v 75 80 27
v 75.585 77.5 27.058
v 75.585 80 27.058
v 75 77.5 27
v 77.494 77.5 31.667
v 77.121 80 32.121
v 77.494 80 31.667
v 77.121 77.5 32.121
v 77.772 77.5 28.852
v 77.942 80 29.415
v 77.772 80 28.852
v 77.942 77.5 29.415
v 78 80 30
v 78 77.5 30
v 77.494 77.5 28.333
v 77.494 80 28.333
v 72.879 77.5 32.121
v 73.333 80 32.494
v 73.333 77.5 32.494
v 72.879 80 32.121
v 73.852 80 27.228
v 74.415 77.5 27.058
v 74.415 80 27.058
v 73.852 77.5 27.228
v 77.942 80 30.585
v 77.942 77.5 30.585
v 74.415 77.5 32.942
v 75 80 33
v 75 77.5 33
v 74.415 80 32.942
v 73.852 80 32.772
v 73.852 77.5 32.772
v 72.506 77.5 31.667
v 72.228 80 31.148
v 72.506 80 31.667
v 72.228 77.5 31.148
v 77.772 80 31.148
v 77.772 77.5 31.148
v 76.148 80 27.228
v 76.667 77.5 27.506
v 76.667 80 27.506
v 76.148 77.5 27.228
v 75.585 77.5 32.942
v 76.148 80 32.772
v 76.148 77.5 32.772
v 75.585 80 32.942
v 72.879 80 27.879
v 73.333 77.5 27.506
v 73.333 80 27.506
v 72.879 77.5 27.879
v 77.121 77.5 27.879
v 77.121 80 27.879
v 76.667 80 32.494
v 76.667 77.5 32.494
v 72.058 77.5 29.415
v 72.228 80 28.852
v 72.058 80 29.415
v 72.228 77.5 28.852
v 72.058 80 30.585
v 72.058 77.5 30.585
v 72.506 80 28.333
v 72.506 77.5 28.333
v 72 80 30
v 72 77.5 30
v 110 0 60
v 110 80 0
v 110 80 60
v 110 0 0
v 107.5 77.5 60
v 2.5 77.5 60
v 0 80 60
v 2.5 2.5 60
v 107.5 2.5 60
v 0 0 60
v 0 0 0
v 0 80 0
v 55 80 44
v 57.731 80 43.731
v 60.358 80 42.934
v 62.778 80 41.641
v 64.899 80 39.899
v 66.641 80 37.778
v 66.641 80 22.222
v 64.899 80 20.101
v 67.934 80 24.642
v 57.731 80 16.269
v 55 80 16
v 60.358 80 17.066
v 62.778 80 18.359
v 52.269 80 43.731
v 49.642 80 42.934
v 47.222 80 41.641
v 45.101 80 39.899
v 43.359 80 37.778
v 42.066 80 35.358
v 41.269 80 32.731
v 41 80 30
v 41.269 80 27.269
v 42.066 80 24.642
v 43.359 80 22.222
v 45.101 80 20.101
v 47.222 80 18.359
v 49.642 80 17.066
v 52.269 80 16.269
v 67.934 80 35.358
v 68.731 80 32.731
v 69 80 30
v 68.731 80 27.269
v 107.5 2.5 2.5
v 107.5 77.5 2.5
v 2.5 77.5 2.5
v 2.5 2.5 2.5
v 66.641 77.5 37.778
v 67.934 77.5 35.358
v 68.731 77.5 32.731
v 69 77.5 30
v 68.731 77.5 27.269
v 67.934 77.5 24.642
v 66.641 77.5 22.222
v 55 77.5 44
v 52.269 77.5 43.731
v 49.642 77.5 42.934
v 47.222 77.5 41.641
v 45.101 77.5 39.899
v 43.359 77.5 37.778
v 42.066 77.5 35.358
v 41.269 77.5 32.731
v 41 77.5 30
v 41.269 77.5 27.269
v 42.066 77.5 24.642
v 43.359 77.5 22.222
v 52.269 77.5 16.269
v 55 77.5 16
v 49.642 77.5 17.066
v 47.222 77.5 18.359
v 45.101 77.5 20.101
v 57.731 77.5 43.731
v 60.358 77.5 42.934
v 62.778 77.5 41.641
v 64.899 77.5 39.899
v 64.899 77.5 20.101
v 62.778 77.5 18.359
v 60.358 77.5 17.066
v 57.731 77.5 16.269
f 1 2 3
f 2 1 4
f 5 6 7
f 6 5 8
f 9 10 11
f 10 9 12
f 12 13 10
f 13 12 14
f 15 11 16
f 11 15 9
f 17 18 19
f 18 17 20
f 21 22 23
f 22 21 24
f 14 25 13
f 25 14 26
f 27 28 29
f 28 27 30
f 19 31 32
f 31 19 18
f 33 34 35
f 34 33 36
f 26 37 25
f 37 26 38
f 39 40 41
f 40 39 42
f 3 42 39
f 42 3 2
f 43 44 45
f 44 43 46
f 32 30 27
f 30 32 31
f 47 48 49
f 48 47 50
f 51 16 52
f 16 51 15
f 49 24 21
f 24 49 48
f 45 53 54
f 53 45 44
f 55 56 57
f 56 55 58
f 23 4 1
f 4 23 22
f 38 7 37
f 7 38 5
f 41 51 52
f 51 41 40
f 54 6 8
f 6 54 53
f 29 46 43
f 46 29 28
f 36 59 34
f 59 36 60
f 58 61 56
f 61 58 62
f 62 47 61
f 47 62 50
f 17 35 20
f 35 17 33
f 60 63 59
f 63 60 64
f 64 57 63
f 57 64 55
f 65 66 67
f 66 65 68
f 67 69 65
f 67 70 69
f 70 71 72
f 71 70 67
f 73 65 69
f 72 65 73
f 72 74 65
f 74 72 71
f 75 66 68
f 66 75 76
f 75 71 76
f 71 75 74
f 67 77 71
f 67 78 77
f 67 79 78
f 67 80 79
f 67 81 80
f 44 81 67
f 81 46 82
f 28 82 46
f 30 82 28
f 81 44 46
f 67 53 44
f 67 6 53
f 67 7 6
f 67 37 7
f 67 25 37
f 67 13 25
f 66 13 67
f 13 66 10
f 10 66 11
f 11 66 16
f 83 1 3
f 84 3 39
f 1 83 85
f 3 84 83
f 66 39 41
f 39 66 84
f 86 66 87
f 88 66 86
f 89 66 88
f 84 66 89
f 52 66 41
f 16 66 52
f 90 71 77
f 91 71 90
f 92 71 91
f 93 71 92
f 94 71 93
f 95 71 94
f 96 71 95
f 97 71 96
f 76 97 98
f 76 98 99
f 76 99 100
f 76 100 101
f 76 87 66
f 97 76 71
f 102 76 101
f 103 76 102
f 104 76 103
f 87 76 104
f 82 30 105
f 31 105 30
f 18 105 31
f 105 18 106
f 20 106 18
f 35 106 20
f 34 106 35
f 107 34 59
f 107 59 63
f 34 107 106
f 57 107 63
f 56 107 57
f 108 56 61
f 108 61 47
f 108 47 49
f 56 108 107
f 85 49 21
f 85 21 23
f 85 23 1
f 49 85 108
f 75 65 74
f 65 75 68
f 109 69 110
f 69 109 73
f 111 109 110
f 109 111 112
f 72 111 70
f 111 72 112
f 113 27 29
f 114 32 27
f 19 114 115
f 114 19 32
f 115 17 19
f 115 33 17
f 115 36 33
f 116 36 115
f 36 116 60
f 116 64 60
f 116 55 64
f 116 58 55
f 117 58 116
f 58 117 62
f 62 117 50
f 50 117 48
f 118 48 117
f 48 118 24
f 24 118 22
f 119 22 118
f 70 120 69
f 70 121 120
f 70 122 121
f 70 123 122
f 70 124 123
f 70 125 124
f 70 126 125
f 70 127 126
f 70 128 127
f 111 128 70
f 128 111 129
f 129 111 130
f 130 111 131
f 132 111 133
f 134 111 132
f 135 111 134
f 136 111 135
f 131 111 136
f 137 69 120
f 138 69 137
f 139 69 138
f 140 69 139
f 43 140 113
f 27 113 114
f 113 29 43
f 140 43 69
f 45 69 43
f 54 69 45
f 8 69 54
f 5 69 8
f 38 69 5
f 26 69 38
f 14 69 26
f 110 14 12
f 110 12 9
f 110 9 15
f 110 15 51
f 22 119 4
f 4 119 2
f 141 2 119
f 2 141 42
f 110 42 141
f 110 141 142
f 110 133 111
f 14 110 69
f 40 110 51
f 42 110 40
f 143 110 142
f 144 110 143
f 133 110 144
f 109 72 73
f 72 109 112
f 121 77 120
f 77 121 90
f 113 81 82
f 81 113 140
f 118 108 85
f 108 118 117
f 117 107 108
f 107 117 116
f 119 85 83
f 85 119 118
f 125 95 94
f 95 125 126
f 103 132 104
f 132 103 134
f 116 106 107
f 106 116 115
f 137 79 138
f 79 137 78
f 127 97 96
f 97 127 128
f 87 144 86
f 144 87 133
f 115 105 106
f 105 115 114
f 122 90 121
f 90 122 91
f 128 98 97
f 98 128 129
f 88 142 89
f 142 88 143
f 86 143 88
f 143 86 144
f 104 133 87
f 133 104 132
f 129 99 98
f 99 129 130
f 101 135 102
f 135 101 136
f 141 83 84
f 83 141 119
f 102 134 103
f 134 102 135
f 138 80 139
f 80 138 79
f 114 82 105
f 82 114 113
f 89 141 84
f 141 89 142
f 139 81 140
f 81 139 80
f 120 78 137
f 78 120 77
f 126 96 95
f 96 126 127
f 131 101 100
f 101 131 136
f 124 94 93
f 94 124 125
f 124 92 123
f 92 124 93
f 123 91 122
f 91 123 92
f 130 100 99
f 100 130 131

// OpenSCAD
$fn = 32;

// ----------------------------------------------------------------------
// Vent box: roundvent enclosure
// ----------------------------------------------------------------------

// --- parameters (mm) ---
box_l = 110;              // box length, X
box_w = 80;               // box width, Y
box_h = 60;               // box height, Z
wall_t = 2.5;             // shell wall thickness
vent_d = 28;              // central vent diameter
ring_d = 6;               // ring hole diameter
n_ring = 8;               // holes in the ring
ring_r = 20;              // ring radius

ring_step = 360 / n_ring;  // ring hole angular step

difference() {
  cube([box_l, box_w, box_h]);
  translate([wall_t, wall_t, wall_t])
    cube([box_l - 2 * wall_t, box_w - 2 * wall_t, box_h]);
  translate([box_l / 2, box_w - wall_t - 1, box_h / 2])
    rotate([-90, 0, 0]) cylinder(h = wall_t + 2, d = vent_d);
  for (i = [0 : n_ring - 1])
    translate([box_l / 2, box_w - wall_t - 1, box_h / 2])
      rotate([0, 0, i * ring_step])
        translate([ring_r, 0, 0]) rotate([-90, 0, 0])
          cylinder(h = wall_t + 2, d = ring_d);
}
